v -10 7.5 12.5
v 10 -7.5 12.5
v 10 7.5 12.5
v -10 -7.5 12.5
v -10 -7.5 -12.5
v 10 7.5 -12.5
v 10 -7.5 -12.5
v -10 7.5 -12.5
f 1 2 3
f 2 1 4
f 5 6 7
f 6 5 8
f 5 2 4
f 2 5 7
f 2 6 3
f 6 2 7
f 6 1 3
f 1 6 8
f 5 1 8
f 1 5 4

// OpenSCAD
// Generated by generate_scads.py
cube(size=[20,15,25], center=true);
